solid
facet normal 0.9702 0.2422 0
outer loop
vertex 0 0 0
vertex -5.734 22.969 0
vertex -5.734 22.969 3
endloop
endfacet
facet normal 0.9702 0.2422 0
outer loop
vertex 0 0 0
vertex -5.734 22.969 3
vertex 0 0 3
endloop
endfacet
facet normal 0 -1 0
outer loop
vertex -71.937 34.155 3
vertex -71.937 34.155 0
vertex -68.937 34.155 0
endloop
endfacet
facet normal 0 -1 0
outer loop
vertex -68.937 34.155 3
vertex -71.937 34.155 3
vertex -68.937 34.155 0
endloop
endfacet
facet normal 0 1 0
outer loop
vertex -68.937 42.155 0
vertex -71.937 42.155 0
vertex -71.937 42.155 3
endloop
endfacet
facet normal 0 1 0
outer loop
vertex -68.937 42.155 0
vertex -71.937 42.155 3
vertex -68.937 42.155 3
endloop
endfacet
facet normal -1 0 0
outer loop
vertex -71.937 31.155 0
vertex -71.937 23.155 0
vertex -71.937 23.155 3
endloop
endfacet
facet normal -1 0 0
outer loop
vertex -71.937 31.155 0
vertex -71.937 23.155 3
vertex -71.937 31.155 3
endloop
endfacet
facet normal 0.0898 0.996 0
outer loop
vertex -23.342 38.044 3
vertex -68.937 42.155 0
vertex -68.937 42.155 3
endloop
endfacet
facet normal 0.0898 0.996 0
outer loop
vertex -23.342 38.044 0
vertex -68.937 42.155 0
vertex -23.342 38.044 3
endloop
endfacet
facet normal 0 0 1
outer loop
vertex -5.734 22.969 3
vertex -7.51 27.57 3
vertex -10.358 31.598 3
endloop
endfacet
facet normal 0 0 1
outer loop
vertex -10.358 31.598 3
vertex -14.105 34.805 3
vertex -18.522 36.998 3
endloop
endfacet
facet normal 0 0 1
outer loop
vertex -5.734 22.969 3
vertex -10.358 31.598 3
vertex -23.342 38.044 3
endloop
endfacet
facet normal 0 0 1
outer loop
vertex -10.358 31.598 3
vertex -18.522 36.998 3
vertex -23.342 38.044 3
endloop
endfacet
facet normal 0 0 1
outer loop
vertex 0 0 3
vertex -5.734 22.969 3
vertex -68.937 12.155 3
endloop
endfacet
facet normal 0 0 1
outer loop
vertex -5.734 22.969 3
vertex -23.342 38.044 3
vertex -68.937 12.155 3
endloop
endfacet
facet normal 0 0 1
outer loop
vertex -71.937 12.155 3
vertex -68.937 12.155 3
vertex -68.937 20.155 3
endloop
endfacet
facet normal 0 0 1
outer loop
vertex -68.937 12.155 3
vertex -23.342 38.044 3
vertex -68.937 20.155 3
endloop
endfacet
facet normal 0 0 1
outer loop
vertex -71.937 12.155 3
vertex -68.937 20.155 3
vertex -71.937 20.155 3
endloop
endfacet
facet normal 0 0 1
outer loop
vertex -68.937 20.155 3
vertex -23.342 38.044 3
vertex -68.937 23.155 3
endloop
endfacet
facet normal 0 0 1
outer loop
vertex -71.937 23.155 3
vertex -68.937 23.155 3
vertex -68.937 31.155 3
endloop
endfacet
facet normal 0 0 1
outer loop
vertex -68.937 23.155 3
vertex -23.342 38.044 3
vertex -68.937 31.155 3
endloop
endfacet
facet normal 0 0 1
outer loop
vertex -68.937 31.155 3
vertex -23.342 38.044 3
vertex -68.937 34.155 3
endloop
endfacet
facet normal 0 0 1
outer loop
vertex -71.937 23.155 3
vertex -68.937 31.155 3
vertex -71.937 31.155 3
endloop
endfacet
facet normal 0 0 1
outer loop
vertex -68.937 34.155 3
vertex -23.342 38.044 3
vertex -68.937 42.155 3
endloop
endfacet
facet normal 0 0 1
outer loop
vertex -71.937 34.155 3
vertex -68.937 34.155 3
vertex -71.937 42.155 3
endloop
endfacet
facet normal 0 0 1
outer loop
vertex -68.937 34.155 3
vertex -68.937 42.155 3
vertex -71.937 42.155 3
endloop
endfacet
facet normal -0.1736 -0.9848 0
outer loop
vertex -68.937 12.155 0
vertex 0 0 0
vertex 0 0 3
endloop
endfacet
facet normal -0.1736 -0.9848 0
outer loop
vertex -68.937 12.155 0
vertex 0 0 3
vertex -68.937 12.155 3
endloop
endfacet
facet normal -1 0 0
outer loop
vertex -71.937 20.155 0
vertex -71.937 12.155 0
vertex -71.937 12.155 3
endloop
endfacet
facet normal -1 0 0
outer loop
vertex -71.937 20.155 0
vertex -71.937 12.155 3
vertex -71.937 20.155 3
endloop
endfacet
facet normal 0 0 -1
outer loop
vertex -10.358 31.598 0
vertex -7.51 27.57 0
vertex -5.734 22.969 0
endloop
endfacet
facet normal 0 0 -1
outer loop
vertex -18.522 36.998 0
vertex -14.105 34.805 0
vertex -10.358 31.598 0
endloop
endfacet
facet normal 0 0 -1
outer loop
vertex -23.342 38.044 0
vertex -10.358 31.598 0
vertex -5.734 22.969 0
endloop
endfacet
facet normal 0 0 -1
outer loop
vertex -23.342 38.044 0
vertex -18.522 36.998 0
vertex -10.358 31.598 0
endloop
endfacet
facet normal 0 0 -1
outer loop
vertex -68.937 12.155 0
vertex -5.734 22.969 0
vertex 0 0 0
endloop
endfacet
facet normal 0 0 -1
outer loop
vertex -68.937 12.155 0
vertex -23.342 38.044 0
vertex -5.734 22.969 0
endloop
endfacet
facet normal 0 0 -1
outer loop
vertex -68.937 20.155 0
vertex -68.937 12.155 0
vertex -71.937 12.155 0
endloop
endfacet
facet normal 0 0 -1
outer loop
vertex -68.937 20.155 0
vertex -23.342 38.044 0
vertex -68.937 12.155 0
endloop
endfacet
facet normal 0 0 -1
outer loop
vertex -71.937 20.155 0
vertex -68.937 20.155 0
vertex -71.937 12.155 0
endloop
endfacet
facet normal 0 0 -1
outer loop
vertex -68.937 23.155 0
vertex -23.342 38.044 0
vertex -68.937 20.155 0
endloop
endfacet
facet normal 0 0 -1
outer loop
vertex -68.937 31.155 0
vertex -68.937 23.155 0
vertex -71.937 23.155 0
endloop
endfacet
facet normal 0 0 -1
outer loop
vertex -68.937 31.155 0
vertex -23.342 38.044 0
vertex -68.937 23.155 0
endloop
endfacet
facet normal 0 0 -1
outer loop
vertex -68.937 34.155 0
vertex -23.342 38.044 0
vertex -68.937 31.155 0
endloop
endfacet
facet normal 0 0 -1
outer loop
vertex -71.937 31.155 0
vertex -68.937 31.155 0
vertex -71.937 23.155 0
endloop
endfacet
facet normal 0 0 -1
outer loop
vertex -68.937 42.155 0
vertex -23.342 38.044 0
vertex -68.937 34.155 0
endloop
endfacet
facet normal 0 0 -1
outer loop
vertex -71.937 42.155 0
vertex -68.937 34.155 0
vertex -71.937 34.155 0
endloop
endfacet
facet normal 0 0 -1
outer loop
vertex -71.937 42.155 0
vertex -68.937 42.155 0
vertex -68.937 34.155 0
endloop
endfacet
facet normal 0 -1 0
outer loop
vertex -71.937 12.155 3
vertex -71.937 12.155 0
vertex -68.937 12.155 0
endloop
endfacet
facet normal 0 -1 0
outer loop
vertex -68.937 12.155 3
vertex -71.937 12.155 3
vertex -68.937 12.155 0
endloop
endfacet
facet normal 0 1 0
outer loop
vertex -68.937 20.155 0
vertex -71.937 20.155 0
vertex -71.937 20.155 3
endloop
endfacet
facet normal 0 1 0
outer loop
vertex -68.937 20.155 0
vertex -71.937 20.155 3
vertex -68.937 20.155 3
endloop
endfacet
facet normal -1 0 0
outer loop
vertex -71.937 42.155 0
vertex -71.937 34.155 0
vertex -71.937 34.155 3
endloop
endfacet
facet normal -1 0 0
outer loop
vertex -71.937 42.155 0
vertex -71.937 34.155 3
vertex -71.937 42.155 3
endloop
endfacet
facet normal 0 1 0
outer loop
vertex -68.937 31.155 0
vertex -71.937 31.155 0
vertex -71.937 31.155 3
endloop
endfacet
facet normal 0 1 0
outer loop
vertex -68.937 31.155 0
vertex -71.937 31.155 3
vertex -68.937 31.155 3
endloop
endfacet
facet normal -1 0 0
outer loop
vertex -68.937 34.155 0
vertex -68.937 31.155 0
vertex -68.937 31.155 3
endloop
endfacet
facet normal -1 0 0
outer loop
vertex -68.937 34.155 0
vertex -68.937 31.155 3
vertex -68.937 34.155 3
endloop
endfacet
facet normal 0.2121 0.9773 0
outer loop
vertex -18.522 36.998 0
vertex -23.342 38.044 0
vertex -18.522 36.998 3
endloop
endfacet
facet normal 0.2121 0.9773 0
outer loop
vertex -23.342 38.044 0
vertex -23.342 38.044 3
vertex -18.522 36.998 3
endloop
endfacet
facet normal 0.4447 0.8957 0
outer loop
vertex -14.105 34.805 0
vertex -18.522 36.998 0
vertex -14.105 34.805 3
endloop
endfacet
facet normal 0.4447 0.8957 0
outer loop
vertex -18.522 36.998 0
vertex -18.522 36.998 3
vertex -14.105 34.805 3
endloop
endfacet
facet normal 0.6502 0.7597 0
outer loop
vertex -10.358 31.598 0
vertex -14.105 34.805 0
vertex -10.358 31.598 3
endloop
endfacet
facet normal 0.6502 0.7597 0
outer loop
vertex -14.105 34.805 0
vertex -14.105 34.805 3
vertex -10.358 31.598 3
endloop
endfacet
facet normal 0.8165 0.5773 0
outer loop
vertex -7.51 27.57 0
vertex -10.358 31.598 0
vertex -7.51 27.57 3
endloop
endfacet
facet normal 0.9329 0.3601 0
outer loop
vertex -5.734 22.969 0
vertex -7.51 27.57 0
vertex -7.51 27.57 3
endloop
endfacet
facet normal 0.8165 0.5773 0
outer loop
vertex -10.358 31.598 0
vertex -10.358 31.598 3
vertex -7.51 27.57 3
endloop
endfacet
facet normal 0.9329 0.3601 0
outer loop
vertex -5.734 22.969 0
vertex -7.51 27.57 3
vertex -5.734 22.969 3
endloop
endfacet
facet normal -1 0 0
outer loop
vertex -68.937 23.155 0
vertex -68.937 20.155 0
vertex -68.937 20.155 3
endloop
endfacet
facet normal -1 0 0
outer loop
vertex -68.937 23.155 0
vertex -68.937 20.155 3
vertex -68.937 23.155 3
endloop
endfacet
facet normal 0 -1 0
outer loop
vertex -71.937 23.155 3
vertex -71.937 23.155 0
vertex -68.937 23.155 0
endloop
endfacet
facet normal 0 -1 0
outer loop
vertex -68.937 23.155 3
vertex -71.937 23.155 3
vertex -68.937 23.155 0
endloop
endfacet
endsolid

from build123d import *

# Parameters (mm, degrees)
ESQUISSE1_W        = 3
ESQUISSE1_H        = 8
BOSS_EXTRU_1_DEPTH = 3
CONG_1_R           = 20


with BuildPart() as part:
    # Esquisse1 → Boss.-Extru.1 (new body)
    with BuildSketch(Plane.XY):
        Polygon((-68.936542711, 42.155372437), (-9.179039763, 36.766416935), (0, 0), (-68.936542711, 12.155372437), align=None)
        with Locations((-70.436542711, 38.155372437)):
            Rectangle(ESQUISSE1_W, ESQUISSE1_H)
        with Locations((-70.436542711, 27.155372437)):
            Rectangle(ESQUISSE1_W, ESQUISSE1_H)
        with Locations((-70.436542711, 16.155372437)):
            Rectangle(ESQUISSE1_W, ESQUISSE1_H)
    extrude(amount=BOSS_EXTRU_1_DEPTH)

    # Congé1
    cong_1_edges = [part.edges().sort_by_distance(p)[0] for p in [
        (-9.179039763, 36.766416935, 1.5),
    ]]
    fillet(cong_1_edges, radius=CONG_1_R)


solid = part.part
